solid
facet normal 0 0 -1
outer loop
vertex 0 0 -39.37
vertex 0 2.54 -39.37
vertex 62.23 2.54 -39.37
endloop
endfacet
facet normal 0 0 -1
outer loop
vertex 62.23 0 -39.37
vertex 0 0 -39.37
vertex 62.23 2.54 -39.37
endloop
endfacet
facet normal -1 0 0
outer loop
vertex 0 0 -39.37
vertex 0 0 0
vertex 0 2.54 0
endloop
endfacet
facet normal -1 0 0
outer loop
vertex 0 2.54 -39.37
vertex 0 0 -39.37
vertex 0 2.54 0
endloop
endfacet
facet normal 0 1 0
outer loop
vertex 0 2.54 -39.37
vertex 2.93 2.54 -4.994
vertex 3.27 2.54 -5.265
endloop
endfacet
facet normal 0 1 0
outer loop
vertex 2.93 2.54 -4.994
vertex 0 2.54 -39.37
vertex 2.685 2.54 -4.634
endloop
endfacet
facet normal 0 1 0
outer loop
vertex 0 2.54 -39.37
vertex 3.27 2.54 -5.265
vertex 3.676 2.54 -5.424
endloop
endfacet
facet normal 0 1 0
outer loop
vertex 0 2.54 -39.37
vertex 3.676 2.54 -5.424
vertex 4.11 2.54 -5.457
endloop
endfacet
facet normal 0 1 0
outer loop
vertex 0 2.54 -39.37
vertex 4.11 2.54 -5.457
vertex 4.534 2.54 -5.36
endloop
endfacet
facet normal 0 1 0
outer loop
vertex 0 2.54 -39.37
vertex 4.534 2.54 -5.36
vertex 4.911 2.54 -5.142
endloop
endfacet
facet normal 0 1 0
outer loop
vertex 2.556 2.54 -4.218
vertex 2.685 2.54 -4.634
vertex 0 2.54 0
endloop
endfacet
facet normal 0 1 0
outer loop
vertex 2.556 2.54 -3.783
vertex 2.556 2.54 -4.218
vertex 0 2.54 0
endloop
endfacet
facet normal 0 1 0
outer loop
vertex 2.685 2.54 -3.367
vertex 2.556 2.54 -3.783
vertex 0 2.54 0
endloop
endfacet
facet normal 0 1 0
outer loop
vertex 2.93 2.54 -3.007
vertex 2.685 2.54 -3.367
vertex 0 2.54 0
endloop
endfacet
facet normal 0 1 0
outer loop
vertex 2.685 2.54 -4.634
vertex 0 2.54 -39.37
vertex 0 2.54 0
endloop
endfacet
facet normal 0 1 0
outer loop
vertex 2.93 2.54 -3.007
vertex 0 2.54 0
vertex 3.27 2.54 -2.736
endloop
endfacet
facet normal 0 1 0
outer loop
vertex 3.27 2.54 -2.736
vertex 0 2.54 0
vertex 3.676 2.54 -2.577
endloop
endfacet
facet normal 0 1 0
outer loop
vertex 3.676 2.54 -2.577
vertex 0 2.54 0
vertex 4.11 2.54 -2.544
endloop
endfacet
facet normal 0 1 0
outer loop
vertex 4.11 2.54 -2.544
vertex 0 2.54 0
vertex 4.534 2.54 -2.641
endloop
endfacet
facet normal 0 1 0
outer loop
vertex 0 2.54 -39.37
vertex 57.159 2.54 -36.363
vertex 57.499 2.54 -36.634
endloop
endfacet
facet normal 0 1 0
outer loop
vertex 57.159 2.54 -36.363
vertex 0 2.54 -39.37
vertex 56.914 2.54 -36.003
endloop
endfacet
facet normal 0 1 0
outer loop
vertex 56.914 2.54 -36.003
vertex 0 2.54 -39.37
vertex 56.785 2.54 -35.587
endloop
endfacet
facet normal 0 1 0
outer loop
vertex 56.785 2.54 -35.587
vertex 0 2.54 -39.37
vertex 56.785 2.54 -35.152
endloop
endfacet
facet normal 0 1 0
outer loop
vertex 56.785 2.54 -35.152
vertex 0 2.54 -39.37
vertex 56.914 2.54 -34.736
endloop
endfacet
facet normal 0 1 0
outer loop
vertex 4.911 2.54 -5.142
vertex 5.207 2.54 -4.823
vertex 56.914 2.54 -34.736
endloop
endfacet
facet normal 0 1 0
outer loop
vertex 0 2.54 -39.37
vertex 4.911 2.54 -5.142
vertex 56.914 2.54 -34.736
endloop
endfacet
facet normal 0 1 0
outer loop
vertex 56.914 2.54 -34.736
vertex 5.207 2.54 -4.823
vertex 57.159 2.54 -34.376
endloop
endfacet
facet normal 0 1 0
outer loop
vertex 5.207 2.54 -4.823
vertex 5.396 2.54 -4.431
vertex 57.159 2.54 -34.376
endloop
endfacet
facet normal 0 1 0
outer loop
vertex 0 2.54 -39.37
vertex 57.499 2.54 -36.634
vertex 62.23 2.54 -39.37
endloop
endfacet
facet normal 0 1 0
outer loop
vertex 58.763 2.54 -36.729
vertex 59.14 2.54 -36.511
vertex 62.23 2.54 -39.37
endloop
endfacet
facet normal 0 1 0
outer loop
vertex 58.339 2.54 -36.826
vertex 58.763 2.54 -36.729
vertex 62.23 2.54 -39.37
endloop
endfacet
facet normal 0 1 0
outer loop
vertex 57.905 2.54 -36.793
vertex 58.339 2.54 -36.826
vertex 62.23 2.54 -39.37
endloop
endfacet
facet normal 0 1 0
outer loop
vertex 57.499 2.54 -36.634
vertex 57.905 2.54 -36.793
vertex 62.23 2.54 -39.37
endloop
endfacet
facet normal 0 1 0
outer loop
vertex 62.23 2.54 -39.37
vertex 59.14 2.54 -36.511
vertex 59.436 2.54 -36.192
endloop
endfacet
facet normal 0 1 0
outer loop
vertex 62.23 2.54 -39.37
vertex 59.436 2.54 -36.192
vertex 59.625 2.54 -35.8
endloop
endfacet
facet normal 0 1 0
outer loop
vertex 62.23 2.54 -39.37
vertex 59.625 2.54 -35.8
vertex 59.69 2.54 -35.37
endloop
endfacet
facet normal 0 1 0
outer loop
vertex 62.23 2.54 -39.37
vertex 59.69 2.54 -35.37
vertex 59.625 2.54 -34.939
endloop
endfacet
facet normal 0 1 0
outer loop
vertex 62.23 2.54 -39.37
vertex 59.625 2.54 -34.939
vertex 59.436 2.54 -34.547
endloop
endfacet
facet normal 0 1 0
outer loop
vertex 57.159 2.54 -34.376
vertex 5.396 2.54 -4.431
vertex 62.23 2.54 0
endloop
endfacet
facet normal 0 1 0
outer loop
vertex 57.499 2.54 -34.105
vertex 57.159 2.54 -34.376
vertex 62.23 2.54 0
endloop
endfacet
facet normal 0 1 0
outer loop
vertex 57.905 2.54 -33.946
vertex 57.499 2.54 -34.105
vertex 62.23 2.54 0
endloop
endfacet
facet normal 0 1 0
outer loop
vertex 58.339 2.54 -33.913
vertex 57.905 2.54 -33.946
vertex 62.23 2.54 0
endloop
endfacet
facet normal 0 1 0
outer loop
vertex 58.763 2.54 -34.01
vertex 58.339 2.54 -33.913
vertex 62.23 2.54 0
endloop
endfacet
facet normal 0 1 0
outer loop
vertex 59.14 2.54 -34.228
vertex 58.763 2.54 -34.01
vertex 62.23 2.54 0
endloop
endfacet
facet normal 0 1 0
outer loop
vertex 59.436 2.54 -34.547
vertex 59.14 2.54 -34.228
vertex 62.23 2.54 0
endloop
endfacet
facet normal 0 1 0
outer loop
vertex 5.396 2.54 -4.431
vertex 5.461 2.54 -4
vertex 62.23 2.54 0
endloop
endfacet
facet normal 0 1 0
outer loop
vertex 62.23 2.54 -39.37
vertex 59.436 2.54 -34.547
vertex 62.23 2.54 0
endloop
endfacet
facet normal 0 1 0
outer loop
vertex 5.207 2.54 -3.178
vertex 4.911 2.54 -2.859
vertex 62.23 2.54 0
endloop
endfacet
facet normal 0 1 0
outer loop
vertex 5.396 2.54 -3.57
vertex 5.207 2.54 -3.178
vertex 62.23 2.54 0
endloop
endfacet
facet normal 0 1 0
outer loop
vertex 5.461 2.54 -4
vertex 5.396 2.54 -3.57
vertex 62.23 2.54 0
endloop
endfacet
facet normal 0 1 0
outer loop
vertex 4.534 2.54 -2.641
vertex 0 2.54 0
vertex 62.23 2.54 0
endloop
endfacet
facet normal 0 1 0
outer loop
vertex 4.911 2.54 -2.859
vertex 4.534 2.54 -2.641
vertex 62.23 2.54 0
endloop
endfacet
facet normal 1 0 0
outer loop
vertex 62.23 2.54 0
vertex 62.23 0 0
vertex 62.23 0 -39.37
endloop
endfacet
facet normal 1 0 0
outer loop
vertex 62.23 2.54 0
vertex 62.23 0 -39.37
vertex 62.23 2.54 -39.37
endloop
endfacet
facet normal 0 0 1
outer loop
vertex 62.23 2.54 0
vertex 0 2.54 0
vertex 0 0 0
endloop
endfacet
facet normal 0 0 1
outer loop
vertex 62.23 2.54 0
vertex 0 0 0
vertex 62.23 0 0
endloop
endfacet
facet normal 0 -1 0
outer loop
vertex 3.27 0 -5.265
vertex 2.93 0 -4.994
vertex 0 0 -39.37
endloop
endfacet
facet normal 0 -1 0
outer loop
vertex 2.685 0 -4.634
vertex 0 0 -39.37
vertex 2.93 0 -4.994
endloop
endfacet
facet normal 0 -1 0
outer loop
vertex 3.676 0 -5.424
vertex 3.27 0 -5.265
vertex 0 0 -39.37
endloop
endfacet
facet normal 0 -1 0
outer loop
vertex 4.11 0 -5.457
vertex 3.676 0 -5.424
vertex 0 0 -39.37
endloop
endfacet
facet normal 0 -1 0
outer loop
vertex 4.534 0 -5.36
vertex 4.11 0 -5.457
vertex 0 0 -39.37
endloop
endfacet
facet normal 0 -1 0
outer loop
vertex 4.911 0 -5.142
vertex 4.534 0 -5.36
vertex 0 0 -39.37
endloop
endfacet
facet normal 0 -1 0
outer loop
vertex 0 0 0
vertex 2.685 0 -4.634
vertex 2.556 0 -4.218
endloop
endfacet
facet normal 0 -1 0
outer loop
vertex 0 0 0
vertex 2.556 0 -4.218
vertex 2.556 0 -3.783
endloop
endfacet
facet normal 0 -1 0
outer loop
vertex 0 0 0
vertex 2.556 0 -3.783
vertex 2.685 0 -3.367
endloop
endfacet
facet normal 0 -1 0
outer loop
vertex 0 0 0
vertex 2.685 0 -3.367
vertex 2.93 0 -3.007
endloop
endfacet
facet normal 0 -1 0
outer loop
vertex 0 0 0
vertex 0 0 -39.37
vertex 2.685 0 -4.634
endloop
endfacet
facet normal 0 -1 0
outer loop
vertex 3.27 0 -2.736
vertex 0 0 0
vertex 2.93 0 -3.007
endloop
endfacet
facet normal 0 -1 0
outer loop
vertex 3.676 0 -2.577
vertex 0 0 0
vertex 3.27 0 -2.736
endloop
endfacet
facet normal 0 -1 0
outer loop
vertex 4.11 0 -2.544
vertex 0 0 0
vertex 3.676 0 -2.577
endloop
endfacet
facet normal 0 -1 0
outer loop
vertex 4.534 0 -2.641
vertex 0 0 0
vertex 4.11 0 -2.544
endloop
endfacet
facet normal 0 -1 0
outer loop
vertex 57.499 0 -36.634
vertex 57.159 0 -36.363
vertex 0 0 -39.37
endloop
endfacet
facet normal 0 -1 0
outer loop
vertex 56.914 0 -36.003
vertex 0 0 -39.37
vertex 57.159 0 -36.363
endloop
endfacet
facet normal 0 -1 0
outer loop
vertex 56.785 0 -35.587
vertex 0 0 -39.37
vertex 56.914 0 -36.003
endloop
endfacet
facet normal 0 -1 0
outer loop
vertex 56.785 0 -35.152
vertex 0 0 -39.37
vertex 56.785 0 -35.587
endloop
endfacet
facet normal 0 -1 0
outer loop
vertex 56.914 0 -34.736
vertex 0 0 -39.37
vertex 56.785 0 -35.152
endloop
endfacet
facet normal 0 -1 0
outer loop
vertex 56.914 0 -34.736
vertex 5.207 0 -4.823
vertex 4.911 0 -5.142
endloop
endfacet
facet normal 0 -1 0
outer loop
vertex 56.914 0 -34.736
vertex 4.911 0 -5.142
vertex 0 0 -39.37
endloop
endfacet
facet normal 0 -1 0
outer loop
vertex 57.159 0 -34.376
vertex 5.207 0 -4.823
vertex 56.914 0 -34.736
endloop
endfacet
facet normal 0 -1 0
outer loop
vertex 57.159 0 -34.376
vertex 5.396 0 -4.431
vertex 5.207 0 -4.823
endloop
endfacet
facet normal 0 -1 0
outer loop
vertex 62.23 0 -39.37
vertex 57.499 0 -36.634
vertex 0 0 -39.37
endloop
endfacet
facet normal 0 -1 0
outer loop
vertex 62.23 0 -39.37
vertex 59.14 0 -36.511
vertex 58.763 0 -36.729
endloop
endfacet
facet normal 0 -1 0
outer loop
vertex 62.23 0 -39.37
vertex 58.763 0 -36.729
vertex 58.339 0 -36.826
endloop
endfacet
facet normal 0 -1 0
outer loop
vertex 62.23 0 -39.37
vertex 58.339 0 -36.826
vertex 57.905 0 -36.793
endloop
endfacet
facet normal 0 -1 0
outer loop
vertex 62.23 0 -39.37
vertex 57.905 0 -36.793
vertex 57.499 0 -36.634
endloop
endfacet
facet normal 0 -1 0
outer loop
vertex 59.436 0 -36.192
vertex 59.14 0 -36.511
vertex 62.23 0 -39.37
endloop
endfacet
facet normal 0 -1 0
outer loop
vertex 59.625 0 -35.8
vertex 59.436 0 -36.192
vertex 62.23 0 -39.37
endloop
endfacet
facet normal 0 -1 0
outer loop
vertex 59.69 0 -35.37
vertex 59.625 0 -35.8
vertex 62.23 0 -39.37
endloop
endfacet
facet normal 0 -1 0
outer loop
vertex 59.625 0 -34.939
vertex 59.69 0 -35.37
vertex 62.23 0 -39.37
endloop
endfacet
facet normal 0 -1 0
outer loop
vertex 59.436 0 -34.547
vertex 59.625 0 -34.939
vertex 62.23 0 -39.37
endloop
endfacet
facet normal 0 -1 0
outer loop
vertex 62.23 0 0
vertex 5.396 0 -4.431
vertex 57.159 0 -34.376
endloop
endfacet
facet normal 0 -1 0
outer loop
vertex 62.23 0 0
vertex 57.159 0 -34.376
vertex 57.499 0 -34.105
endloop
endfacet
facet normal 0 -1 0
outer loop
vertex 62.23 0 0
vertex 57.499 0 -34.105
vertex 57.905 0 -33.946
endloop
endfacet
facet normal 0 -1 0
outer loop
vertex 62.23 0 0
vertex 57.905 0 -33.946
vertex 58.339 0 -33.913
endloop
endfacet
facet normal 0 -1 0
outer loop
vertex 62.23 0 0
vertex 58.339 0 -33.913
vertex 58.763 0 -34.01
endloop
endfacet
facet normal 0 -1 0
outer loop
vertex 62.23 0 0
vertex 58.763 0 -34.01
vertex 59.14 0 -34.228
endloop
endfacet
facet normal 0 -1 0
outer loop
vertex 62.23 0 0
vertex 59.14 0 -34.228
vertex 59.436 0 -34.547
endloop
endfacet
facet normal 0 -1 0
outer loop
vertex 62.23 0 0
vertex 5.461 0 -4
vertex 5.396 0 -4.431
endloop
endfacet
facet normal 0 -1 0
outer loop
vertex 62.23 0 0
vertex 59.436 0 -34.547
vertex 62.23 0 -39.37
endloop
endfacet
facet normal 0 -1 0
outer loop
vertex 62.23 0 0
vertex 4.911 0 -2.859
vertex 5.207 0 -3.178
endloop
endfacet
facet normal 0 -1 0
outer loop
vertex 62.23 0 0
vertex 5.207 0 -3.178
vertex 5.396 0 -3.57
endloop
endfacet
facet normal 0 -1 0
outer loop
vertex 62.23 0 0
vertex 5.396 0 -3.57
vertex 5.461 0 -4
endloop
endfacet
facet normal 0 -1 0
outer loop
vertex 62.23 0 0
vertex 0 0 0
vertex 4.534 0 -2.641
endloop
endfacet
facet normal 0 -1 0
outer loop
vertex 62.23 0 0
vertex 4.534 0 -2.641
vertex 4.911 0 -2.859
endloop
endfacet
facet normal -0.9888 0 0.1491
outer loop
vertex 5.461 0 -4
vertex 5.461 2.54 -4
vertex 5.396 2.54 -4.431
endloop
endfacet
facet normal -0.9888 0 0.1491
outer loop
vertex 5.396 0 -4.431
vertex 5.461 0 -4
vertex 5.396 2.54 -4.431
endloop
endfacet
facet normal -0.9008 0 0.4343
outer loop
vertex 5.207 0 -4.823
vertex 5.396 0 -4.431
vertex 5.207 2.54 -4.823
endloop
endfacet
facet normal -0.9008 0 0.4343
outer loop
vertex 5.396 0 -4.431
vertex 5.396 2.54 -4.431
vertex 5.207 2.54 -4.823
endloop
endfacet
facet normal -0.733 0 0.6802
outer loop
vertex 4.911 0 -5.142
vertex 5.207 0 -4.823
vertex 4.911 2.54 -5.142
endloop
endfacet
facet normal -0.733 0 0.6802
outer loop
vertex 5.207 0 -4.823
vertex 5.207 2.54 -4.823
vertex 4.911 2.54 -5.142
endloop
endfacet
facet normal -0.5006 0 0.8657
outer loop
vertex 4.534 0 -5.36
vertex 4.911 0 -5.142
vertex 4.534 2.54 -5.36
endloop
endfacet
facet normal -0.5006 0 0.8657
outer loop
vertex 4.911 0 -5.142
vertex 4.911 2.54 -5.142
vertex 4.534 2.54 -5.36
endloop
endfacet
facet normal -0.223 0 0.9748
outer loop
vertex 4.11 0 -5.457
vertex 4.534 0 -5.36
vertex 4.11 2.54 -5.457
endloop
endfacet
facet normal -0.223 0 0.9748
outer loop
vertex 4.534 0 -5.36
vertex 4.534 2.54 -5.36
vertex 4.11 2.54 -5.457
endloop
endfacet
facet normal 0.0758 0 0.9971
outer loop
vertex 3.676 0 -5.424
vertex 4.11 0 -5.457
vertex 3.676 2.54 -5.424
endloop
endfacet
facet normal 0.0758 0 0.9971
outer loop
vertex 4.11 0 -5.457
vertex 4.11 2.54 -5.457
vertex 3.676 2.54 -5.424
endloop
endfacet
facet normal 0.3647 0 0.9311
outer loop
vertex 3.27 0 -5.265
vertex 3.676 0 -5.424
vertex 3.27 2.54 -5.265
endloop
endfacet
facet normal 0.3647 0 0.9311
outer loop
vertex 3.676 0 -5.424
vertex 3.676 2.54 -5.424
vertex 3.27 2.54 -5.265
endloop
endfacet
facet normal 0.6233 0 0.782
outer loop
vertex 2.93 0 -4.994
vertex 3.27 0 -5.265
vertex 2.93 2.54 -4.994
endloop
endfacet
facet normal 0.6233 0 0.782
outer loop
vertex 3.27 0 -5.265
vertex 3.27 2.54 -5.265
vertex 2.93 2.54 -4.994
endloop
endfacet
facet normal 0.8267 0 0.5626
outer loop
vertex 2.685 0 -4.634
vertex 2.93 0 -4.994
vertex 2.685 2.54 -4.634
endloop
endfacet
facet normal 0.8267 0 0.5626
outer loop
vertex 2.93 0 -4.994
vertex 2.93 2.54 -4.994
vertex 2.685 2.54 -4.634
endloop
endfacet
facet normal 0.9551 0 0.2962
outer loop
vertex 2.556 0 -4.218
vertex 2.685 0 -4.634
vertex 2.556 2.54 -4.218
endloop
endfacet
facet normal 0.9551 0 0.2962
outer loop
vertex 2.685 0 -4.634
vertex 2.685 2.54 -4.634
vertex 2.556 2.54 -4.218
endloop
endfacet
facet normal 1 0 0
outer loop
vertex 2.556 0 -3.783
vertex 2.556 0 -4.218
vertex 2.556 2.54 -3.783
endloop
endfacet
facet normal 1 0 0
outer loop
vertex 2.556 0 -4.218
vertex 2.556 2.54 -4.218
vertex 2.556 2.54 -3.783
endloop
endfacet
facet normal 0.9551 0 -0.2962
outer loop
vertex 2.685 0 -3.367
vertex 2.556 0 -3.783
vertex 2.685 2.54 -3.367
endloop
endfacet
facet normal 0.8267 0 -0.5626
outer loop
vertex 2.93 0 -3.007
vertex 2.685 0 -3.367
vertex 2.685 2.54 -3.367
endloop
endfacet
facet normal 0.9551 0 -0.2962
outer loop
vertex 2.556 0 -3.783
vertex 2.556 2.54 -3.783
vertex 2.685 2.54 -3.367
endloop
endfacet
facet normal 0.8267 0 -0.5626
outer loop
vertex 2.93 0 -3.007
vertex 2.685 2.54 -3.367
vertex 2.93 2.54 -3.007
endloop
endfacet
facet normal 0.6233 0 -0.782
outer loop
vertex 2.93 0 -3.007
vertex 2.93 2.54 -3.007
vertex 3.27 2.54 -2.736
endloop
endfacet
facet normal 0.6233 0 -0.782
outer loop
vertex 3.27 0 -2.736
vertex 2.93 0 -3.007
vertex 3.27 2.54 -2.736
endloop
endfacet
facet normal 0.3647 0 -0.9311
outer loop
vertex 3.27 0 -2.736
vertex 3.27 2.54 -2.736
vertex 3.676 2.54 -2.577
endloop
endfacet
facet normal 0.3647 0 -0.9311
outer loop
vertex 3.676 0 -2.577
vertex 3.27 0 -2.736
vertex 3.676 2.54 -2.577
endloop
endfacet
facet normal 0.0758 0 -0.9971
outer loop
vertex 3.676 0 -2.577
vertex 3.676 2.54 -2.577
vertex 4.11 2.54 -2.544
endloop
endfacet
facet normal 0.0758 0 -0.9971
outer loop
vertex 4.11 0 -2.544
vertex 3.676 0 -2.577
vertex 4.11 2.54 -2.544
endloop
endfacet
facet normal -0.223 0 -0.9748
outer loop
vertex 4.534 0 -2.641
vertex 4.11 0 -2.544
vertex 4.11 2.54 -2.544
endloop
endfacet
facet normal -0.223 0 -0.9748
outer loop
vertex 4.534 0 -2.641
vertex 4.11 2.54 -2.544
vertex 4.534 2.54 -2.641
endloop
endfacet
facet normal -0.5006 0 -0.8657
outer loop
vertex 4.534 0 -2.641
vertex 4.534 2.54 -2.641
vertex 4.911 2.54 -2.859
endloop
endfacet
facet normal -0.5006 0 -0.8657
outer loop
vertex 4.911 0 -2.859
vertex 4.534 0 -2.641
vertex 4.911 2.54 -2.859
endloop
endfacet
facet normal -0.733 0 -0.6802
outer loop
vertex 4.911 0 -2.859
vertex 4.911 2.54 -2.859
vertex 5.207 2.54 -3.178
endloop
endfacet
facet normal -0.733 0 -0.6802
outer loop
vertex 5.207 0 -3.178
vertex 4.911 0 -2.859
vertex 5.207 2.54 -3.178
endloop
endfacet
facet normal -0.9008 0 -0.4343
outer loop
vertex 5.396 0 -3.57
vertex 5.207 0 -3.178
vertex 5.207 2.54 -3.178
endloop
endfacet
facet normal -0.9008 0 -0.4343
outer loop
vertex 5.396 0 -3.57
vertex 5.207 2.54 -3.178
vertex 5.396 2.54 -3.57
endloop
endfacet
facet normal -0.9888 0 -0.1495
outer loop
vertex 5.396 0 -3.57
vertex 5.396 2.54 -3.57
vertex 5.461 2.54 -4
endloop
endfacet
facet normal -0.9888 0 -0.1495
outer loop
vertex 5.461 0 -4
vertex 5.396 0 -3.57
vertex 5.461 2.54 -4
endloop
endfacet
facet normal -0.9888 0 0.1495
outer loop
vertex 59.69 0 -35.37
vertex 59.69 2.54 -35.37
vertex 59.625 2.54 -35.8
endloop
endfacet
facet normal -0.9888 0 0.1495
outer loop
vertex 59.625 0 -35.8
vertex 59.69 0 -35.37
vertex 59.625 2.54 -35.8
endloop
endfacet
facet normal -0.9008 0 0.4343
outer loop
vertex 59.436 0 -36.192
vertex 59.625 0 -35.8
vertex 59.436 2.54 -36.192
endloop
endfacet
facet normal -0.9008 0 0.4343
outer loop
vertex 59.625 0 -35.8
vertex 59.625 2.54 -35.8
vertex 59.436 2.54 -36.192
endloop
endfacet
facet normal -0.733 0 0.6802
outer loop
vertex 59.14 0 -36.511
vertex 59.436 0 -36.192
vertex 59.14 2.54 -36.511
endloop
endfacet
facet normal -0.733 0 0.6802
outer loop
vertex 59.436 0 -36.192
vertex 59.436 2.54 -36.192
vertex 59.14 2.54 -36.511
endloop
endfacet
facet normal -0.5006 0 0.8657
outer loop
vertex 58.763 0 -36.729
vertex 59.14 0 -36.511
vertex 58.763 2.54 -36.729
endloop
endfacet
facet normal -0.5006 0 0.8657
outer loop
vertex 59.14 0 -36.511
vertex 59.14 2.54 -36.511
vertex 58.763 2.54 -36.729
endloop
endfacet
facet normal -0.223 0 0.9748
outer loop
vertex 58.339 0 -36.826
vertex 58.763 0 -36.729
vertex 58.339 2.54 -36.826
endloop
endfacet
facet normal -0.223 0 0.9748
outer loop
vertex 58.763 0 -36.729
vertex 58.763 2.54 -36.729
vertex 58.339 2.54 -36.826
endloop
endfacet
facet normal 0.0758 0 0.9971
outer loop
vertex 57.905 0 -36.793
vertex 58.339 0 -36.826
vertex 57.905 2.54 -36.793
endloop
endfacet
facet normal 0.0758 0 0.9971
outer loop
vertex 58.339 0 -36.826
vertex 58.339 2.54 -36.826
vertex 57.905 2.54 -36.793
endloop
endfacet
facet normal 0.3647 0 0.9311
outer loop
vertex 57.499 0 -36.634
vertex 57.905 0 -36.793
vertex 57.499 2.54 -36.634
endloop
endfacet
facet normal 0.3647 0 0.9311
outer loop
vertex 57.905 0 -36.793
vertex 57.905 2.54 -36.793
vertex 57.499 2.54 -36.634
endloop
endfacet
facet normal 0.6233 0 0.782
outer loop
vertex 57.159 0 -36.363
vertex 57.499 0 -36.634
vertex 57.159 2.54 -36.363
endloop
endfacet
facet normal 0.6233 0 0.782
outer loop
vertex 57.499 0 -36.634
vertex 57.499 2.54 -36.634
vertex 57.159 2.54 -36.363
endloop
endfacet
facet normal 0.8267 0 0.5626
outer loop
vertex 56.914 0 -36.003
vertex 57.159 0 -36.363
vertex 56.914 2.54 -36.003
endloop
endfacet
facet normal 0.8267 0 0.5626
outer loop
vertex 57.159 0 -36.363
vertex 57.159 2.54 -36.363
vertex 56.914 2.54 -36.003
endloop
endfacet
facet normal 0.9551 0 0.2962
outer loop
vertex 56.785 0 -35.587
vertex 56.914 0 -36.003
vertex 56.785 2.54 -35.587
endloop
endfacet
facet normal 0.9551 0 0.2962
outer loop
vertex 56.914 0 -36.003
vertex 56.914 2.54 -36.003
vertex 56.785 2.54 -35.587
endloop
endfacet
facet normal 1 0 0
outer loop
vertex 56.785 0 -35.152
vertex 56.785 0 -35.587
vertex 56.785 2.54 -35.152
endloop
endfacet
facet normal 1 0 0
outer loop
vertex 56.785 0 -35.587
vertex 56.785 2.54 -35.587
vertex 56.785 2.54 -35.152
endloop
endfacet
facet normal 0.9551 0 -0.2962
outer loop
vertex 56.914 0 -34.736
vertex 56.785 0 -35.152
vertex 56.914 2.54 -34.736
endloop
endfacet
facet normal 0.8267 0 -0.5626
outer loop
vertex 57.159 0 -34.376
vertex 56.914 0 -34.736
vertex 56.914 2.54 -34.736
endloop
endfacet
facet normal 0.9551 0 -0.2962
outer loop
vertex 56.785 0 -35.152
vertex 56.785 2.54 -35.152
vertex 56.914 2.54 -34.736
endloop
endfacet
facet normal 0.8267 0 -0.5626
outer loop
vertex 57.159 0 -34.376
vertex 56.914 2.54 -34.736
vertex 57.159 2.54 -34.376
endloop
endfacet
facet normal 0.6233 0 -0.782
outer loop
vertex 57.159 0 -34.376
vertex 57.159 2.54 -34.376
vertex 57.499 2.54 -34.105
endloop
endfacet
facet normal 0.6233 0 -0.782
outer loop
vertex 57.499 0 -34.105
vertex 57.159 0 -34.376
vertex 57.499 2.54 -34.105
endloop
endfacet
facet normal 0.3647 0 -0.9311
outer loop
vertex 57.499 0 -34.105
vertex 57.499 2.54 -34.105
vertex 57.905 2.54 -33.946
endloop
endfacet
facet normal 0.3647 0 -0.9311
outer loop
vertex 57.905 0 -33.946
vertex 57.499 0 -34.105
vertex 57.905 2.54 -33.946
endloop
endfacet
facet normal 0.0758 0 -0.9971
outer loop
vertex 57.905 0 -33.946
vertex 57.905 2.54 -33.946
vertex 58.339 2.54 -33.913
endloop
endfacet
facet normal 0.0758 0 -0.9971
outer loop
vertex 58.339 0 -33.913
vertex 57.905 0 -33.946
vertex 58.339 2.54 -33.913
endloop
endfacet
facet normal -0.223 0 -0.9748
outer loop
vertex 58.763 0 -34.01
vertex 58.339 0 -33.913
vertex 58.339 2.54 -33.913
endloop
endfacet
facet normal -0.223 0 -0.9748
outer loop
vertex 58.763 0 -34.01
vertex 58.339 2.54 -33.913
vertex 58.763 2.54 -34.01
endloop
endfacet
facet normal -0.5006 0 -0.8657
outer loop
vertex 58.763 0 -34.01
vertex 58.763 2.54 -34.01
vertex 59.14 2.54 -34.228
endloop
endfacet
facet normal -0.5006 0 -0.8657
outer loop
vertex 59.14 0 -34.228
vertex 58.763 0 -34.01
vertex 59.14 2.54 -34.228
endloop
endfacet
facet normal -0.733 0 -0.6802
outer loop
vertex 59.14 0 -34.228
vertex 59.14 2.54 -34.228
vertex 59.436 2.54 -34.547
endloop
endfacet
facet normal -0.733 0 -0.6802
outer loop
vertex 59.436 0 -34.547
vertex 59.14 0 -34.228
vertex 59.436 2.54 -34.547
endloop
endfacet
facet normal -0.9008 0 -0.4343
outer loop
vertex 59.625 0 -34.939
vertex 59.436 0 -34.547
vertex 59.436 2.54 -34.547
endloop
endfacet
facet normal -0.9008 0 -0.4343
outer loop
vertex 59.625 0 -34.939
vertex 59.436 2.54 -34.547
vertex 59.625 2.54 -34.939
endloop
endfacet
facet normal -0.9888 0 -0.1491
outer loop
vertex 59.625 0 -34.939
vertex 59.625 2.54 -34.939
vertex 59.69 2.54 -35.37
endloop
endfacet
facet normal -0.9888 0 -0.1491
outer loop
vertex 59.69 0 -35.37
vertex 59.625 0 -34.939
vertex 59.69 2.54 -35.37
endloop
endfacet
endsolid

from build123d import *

# Parameters (mm, degrees)
SKETCH1_W           = 62.23
SKETCH1_H           = 2.54
BOSS_EXTRUDE1_DEPTH = 39.37
SKETCH2_R           = 1.4605
CUT_EXTRUDE1_DEPTH  = 3.54


with BuildPart() as part:
    # Sketch1 → Boss-Extrude1 (new body)
    with BuildSketch(Plane.XY):
        with Locations((31.115, 1.27)):
            Rectangle(SKETCH1_W, SKETCH1_H)
    extrude(amount=-BOSS_EXTRUDE1_DEPTH)

    # Sketch2 → Cut-Extrude1 (cut, through all)
    with BuildSketch(Plane(origin=(0, 2.54, 0), x_dir=(1, 0, 0), z_dir=(0, 1, 0))):
        with Locations((4.0005, 4.0005)):
            Circle(SKETCH2_R)
        with Locations((58.2295, 35.3695)):
            Circle(SKETCH2_R)
    extrude(amount=-CUT_EXTRUDE1_DEPTH, mode=Mode.SUBTRACT)


solid = part.part
